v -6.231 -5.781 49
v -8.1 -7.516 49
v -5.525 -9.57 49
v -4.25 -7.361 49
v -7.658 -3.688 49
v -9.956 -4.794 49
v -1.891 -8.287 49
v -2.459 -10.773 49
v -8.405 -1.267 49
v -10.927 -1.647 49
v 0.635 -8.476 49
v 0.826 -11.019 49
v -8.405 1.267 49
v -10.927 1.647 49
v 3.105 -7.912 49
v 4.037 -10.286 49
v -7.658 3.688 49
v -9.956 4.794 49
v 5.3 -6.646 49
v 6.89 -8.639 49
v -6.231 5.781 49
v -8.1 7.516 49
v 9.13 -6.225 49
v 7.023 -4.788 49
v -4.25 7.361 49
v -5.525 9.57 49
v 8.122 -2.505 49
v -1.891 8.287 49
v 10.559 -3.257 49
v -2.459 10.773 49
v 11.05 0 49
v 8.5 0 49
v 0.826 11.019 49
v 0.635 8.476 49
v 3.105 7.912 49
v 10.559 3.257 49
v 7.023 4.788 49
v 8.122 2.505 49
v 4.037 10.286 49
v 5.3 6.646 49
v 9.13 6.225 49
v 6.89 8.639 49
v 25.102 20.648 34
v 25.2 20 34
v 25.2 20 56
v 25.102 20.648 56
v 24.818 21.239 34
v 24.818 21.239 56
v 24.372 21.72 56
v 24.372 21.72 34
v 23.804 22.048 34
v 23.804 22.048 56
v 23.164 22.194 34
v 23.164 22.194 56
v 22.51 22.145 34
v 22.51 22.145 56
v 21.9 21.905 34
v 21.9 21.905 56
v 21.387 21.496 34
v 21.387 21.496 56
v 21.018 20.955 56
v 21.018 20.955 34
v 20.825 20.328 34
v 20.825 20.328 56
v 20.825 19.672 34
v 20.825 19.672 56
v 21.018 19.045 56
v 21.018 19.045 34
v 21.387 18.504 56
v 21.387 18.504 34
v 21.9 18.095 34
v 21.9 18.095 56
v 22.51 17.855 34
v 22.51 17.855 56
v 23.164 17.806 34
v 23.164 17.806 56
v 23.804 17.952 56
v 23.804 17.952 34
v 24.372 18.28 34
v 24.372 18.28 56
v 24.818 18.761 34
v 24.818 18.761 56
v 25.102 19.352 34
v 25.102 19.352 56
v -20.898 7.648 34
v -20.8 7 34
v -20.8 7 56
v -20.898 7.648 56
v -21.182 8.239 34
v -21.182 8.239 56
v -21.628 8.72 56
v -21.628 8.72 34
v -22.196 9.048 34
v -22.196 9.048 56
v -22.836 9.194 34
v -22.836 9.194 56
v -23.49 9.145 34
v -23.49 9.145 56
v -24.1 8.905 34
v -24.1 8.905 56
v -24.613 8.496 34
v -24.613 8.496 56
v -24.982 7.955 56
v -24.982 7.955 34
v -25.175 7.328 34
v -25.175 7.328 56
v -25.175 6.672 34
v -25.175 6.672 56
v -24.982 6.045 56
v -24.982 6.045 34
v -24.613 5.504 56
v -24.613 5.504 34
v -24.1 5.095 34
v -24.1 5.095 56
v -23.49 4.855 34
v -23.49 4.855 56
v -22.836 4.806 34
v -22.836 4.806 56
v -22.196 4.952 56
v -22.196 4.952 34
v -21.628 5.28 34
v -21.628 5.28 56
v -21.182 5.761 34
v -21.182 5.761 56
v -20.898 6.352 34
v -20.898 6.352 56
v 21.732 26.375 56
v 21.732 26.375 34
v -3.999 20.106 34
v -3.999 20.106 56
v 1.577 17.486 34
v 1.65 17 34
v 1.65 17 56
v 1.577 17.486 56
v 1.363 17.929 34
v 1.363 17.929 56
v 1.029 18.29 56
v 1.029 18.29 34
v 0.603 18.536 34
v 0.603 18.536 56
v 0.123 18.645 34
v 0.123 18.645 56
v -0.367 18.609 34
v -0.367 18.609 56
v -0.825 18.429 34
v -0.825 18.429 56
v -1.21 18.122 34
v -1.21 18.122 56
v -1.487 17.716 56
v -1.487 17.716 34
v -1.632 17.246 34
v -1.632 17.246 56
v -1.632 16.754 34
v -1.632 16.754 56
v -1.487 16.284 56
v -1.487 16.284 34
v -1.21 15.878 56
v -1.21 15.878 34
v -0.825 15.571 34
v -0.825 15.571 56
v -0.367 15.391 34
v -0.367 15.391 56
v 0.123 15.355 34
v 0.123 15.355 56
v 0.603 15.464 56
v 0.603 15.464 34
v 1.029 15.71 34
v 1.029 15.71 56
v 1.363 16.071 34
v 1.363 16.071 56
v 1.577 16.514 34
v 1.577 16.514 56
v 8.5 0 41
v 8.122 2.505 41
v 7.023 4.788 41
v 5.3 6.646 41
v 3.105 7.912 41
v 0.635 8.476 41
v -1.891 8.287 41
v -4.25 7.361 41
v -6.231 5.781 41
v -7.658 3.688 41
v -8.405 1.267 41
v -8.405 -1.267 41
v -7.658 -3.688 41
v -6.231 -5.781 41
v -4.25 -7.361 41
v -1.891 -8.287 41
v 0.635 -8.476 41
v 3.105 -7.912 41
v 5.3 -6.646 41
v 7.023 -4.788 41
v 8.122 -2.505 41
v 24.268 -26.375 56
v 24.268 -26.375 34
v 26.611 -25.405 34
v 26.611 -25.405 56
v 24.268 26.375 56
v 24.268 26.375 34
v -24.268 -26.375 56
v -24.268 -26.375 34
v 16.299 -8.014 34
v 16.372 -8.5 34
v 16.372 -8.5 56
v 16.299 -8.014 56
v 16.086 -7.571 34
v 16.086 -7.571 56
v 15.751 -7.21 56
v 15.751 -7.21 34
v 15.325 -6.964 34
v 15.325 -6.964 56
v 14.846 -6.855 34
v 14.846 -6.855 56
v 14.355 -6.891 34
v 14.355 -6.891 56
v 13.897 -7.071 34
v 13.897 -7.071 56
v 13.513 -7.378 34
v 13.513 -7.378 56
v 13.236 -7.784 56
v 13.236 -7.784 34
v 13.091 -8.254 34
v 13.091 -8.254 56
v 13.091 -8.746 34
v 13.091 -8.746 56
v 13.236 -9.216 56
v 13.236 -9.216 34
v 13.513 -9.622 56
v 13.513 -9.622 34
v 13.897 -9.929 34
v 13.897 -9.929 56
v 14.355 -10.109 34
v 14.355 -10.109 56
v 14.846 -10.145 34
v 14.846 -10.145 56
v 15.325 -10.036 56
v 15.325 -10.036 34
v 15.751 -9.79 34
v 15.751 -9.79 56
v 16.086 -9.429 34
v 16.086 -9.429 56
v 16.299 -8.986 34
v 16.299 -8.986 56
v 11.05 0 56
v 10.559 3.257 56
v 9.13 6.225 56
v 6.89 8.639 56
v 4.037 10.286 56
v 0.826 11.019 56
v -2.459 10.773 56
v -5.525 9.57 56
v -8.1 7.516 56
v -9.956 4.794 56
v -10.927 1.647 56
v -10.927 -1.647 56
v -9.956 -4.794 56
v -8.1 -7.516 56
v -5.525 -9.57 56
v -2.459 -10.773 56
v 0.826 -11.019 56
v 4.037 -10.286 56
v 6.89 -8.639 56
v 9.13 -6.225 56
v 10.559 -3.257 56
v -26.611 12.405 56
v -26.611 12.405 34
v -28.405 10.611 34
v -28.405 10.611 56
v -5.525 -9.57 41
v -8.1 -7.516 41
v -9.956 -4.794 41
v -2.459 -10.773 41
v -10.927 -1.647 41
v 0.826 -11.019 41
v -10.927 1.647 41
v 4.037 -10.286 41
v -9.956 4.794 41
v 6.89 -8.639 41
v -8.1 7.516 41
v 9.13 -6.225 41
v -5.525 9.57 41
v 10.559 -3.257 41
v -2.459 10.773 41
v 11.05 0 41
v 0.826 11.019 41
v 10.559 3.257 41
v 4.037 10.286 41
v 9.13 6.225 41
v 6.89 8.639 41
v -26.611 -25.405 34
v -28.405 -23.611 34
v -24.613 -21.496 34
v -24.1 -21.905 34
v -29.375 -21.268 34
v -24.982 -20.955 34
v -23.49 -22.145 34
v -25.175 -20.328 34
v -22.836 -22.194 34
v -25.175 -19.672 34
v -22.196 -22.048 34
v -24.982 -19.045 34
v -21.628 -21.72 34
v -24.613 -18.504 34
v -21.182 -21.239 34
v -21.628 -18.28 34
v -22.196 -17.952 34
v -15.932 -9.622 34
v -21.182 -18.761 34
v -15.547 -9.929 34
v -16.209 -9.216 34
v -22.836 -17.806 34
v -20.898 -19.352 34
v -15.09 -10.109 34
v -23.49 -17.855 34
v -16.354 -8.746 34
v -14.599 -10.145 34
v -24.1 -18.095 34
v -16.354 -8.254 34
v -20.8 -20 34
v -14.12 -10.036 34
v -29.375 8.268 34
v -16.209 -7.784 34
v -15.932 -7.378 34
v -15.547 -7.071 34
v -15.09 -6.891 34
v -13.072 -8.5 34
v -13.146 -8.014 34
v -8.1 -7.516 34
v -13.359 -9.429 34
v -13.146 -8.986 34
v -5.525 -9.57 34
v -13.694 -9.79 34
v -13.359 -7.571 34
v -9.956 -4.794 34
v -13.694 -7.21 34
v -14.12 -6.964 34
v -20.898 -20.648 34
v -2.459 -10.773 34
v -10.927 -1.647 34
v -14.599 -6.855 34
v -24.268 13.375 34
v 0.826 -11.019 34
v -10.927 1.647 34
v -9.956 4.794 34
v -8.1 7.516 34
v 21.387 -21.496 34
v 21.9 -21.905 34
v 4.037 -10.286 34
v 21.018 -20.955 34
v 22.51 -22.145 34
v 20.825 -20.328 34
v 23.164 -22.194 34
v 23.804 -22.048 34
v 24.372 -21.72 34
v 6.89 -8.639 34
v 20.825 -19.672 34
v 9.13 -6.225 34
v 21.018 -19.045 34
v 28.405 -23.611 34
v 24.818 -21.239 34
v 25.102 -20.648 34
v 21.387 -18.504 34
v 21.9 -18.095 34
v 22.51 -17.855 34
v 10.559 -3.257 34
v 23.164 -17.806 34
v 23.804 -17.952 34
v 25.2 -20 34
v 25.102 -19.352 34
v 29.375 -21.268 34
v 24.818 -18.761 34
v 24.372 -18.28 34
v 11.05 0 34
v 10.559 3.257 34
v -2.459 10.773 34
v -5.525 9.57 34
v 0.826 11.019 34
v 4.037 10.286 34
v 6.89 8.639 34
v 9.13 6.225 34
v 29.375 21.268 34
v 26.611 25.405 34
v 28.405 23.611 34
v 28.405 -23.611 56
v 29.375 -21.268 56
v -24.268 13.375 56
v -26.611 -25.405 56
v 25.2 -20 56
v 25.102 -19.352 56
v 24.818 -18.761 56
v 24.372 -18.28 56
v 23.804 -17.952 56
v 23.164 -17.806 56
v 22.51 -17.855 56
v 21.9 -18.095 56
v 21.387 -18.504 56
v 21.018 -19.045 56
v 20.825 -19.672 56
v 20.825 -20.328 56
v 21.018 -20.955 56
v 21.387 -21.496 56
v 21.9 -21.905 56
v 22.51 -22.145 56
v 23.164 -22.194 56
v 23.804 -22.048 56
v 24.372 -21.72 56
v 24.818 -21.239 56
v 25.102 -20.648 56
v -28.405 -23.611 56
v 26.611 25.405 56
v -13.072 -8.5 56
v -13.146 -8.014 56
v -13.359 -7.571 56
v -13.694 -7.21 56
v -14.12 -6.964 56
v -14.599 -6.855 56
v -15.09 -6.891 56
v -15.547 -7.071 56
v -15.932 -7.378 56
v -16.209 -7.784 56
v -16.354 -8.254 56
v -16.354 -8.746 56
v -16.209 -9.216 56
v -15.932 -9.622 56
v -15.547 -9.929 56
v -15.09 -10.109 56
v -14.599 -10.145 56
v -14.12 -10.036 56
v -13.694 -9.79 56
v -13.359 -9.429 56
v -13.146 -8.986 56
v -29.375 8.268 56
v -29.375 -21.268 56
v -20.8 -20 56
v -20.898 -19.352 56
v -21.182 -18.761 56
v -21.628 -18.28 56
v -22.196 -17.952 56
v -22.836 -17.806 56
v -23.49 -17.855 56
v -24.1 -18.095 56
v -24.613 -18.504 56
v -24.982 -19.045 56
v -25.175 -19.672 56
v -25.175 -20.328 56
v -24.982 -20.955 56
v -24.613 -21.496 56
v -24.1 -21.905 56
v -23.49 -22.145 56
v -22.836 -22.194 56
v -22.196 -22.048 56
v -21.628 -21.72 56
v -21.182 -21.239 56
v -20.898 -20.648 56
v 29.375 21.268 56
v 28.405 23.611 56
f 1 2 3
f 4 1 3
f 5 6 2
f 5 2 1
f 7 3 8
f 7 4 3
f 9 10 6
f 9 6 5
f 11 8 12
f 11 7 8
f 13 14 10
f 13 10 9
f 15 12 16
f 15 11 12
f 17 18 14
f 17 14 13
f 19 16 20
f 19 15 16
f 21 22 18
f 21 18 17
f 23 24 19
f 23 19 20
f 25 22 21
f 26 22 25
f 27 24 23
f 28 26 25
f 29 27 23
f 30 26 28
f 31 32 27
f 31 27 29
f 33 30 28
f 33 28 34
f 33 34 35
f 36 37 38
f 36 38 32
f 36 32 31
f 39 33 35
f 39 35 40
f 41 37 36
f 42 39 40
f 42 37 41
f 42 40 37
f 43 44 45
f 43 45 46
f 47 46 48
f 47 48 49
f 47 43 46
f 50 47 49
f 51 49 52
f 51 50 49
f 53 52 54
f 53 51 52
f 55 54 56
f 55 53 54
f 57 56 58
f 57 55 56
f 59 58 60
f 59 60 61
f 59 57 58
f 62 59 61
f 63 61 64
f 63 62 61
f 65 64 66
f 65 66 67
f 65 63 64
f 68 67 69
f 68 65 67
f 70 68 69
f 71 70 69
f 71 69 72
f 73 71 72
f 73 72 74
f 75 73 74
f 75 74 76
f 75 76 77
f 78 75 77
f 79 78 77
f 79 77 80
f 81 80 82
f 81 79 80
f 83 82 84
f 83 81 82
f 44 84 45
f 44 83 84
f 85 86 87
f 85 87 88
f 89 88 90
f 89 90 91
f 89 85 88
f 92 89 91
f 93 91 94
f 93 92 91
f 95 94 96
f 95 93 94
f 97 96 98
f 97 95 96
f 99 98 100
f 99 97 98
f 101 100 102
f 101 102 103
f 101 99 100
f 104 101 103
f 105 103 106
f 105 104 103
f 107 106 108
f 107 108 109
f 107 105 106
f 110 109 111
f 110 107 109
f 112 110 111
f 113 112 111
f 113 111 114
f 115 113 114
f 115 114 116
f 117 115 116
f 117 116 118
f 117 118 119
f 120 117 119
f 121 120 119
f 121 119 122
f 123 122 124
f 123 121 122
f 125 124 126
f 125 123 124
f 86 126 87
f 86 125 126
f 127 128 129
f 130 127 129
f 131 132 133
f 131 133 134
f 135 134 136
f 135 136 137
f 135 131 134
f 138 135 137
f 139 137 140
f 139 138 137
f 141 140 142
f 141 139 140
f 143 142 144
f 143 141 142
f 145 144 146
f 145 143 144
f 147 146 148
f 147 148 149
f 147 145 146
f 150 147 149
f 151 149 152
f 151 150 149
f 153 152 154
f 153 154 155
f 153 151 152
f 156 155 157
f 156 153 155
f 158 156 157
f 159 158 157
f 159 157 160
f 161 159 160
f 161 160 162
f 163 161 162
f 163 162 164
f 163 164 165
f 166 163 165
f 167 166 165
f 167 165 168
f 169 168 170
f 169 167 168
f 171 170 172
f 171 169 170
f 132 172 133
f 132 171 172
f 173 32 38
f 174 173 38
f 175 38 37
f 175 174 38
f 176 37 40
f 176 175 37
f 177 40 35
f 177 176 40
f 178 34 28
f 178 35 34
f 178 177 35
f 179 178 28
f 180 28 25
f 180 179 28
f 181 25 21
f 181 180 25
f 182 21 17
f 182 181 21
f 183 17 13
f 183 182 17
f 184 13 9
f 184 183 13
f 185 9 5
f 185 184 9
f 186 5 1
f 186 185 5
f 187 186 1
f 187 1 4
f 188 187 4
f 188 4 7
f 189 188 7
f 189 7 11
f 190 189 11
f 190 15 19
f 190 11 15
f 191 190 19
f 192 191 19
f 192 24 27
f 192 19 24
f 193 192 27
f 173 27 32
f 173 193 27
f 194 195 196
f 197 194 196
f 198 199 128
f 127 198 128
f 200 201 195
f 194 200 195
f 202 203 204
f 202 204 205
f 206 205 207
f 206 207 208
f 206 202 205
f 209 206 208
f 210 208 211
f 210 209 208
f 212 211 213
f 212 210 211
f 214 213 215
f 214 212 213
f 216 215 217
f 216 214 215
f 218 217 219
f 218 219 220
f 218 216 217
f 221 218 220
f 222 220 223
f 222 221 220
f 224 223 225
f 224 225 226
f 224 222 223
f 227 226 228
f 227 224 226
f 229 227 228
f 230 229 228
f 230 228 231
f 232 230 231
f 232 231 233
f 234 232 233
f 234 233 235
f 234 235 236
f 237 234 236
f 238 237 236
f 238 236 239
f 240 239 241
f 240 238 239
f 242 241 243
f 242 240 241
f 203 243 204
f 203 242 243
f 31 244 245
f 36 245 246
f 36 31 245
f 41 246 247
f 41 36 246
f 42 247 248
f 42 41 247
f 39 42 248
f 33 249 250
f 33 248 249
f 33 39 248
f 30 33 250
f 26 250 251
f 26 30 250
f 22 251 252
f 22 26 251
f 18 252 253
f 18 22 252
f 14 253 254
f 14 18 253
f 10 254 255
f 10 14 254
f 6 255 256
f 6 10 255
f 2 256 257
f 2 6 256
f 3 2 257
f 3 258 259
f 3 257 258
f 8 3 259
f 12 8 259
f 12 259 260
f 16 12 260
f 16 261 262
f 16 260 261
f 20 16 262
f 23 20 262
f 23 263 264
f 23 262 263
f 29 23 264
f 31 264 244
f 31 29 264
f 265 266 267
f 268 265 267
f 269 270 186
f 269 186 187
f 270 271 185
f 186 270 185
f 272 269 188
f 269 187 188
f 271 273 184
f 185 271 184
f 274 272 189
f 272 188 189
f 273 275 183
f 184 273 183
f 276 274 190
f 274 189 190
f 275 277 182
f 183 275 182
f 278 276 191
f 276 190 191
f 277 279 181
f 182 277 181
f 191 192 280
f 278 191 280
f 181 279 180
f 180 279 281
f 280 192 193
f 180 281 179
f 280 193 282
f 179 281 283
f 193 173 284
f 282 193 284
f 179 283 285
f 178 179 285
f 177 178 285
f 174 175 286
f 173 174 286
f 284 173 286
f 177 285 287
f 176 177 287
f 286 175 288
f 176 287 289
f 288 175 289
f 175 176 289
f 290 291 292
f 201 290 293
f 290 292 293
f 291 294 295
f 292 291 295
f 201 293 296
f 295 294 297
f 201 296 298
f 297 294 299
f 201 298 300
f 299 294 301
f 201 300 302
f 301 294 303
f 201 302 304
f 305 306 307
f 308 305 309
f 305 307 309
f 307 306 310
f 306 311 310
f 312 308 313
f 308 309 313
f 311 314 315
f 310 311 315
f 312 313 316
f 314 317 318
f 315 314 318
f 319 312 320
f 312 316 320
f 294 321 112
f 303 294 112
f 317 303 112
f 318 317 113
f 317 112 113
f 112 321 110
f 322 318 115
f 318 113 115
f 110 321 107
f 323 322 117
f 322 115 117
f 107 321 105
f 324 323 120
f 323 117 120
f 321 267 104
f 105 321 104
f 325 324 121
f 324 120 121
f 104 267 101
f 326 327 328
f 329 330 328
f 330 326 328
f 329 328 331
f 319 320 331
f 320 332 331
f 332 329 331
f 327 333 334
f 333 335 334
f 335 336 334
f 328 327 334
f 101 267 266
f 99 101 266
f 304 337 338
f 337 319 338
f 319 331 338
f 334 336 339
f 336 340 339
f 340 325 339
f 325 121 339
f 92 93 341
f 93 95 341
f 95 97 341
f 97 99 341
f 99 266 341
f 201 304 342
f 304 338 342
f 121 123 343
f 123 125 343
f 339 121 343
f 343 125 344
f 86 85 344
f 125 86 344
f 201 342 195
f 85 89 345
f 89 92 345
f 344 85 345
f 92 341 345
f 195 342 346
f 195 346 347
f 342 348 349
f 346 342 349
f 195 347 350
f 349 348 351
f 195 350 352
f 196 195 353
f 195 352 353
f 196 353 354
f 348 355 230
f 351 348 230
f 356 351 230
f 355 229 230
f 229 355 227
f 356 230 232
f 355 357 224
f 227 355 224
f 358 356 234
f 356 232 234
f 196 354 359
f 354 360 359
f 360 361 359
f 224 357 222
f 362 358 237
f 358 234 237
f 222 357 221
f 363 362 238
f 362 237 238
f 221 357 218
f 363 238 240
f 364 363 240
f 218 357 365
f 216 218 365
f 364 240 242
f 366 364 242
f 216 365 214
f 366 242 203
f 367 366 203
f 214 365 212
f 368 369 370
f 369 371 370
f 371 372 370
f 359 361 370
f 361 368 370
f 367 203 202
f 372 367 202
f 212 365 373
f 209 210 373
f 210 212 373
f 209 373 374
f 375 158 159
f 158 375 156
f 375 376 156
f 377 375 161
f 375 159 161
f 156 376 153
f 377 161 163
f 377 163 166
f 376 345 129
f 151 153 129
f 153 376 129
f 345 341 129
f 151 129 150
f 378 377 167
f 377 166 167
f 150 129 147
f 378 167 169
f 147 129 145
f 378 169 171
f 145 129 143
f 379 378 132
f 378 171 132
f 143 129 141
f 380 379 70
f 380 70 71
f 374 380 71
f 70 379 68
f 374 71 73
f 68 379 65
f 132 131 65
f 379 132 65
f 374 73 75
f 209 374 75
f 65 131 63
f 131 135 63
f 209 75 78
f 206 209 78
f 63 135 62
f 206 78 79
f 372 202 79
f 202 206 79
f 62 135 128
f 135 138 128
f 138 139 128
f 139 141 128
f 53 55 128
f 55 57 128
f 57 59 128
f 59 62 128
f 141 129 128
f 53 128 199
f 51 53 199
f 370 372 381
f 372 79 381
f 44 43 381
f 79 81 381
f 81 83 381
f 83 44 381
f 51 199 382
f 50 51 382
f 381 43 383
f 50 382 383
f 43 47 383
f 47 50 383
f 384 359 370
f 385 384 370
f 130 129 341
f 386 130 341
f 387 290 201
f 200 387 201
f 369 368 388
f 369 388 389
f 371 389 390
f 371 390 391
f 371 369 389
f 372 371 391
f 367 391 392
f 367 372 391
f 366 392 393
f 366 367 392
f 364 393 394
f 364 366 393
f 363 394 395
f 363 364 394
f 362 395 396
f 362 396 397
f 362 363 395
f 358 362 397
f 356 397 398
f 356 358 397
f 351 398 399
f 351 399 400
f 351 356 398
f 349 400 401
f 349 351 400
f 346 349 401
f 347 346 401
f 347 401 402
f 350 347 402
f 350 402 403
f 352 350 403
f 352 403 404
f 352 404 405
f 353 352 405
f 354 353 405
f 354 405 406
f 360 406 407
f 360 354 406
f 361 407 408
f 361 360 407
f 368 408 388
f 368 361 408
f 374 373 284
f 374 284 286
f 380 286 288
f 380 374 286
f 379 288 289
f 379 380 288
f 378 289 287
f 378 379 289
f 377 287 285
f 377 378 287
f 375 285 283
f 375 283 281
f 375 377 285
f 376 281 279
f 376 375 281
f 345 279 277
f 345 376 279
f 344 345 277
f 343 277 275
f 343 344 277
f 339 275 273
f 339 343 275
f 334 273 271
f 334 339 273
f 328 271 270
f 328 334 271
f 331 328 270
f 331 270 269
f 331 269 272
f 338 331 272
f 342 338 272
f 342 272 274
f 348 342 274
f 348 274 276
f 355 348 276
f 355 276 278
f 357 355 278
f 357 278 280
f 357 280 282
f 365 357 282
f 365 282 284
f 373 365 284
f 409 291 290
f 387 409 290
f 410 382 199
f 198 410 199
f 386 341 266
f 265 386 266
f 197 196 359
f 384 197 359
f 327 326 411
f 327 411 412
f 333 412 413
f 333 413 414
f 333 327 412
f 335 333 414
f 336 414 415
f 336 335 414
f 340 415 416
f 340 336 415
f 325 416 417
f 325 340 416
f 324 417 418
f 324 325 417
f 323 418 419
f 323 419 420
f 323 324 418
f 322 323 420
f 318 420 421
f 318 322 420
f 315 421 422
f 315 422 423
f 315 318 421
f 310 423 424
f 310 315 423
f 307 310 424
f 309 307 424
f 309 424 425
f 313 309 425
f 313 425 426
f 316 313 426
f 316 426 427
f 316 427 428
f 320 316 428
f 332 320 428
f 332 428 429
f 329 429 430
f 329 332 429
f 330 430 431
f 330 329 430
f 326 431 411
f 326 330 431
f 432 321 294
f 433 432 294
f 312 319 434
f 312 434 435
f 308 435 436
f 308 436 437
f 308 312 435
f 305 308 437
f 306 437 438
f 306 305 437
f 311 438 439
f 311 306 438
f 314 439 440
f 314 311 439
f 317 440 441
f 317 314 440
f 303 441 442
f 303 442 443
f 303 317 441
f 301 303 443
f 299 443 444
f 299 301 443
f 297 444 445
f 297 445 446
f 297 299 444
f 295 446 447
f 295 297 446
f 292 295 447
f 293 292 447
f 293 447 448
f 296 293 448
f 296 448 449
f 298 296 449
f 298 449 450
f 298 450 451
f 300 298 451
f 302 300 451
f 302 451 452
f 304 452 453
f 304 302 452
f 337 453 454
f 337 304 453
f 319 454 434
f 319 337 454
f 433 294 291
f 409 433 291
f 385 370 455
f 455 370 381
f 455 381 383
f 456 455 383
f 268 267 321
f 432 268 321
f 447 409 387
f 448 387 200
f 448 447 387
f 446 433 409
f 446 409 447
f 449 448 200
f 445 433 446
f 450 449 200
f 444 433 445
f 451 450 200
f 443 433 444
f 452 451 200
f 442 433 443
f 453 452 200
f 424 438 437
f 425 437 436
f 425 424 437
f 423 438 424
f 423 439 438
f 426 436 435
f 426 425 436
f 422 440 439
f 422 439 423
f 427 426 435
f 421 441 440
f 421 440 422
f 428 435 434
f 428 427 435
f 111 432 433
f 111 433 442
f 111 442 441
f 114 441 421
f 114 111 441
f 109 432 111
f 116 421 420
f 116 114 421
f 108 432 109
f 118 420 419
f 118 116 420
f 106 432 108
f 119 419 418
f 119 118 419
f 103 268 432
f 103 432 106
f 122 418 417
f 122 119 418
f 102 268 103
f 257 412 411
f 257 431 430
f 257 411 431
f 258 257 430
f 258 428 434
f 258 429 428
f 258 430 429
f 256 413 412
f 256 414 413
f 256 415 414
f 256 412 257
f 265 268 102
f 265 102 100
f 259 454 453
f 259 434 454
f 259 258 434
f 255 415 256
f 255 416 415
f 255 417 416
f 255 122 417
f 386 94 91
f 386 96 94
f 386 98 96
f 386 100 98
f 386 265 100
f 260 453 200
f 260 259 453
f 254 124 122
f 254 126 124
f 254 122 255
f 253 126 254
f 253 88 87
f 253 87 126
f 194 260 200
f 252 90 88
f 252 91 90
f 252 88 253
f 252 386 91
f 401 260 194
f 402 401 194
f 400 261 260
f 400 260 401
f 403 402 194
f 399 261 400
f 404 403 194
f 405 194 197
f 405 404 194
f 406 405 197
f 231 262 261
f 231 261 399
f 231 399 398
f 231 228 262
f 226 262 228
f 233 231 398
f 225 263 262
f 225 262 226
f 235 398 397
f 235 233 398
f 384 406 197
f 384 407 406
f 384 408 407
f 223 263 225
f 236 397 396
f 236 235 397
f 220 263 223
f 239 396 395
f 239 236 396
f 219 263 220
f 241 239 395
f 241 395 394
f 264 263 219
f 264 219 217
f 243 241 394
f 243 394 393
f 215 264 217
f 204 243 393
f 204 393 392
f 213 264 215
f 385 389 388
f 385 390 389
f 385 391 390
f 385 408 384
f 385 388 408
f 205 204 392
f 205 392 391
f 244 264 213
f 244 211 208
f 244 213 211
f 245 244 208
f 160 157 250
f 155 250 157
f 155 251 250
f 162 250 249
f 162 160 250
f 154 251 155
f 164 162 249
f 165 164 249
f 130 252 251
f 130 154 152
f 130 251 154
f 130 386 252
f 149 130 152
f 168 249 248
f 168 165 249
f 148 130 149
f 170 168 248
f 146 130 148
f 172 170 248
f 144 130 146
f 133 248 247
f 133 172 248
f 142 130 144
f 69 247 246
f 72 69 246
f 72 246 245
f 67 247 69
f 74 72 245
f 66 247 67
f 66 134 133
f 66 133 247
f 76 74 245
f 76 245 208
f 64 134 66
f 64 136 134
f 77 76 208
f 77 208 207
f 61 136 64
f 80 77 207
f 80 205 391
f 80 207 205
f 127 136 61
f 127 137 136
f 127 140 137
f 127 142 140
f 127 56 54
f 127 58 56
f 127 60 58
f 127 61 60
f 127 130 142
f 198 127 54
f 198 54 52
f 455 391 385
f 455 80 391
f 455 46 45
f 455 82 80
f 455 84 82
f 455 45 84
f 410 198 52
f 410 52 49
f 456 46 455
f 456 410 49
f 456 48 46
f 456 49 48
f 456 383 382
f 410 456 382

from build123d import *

# Parameters (mm, degrees)
CARTRIDGE_BODY_START    = 34
PROFILE_1_R             = 8.5
PROFILE_1_R_2           = 2.2
PROFILE_1_R_3           = 1.65
CARTRIDGE_BODY_DEPTH    = 22
INBOARD_608_SEAT_START  = 33.99
PROFILE_2_R             = 11.05
INBOARD_608_SEAT_DEPTH  = 7.01
OUTBOARD_608_SEAT_START = 49
PROFILE_3_R             = 11.05
OUTBOARD_608_SEAT_DEPTH = 7.01


with BuildPart() as part:
    # Profile_1 → Cartridge_body (new body)
    with BuildSketch(Plane.XY.offset(CARTRIDGE_BODY_START)):
        Polygon((-24.268087093, -26.375104323), (24.268087093, -26.375104323), (26.611206515, -25.40455248), (28.40455248, -23.611206515), (29.375104323, -21.268087093), (29.375104323, 21.268087093), (28.40455248, 23.611206515), (26.611206515, 25.40455248), (24.268087093, 26.375104323), (21.731912907, 26.375104323), (-3.999351601, 20.106098248), (-24.268087093, 13.375104323), (-26.611206515, 12.40455248), (-28.40455248, 10.611206515), (-29.375104323, 8.268087093), (-29.375104323, -21.268087093), (-28.40455248, -23.611206515), (-26.611206515, -25.40455248), align=None)
        Circle(PROFILE_1_R, mode=Mode.SUBTRACT)
        with Locations((-23, -20)):
            Circle(PROFILE_1_R_2, mode=Mode.SUBTRACT)
        with Locations((23, -20)):
            Circle(PROFILE_1_R_2, mode=Mode.SUBTRACT)
        with Locations((-23, 7)):
            Circle(PROFILE_1_R_2, mode=Mode.SUBTRACT)
        with Locations((23, 20)):
            Circle(PROFILE_1_R_2, mode=Mode.SUBTRACT)
        with Locations((0, 17)):
            Circle(PROFILE_1_R_3, mode=Mode.SUBTRACT)
        with Locations((-14.722431864, -8.5)):
            Circle(PROFILE_1_R_3, mode=Mode.SUBTRACT)
        with Locations((14.722431864, -8.5)):
            Circle(PROFILE_1_R_3, mode=Mode.SUBTRACT)
    extrude(amount=CARTRIDGE_BODY_DEPTH)

    # Profile_2 → Inboard_608_seat (cut)
    with BuildSketch(Plane.XY.offset(INBOARD_608_SEAT_START)):
        Circle(PROFILE_2_R)
    extrude(amount=INBOARD_608_SEAT_DEPTH, mode=Mode.SUBTRACT)

    # Profile_3 → Outboard_608_seat (cut)
    with BuildSketch(Plane.XY.offset(OUTBOARD_608_SEAT_START)):
        Circle(PROFILE_3_R)
    extrude(amount=OUTBOARD_608_SEAT_DEPTH, mode=Mode.SUBTRACT)


solid = part.part
